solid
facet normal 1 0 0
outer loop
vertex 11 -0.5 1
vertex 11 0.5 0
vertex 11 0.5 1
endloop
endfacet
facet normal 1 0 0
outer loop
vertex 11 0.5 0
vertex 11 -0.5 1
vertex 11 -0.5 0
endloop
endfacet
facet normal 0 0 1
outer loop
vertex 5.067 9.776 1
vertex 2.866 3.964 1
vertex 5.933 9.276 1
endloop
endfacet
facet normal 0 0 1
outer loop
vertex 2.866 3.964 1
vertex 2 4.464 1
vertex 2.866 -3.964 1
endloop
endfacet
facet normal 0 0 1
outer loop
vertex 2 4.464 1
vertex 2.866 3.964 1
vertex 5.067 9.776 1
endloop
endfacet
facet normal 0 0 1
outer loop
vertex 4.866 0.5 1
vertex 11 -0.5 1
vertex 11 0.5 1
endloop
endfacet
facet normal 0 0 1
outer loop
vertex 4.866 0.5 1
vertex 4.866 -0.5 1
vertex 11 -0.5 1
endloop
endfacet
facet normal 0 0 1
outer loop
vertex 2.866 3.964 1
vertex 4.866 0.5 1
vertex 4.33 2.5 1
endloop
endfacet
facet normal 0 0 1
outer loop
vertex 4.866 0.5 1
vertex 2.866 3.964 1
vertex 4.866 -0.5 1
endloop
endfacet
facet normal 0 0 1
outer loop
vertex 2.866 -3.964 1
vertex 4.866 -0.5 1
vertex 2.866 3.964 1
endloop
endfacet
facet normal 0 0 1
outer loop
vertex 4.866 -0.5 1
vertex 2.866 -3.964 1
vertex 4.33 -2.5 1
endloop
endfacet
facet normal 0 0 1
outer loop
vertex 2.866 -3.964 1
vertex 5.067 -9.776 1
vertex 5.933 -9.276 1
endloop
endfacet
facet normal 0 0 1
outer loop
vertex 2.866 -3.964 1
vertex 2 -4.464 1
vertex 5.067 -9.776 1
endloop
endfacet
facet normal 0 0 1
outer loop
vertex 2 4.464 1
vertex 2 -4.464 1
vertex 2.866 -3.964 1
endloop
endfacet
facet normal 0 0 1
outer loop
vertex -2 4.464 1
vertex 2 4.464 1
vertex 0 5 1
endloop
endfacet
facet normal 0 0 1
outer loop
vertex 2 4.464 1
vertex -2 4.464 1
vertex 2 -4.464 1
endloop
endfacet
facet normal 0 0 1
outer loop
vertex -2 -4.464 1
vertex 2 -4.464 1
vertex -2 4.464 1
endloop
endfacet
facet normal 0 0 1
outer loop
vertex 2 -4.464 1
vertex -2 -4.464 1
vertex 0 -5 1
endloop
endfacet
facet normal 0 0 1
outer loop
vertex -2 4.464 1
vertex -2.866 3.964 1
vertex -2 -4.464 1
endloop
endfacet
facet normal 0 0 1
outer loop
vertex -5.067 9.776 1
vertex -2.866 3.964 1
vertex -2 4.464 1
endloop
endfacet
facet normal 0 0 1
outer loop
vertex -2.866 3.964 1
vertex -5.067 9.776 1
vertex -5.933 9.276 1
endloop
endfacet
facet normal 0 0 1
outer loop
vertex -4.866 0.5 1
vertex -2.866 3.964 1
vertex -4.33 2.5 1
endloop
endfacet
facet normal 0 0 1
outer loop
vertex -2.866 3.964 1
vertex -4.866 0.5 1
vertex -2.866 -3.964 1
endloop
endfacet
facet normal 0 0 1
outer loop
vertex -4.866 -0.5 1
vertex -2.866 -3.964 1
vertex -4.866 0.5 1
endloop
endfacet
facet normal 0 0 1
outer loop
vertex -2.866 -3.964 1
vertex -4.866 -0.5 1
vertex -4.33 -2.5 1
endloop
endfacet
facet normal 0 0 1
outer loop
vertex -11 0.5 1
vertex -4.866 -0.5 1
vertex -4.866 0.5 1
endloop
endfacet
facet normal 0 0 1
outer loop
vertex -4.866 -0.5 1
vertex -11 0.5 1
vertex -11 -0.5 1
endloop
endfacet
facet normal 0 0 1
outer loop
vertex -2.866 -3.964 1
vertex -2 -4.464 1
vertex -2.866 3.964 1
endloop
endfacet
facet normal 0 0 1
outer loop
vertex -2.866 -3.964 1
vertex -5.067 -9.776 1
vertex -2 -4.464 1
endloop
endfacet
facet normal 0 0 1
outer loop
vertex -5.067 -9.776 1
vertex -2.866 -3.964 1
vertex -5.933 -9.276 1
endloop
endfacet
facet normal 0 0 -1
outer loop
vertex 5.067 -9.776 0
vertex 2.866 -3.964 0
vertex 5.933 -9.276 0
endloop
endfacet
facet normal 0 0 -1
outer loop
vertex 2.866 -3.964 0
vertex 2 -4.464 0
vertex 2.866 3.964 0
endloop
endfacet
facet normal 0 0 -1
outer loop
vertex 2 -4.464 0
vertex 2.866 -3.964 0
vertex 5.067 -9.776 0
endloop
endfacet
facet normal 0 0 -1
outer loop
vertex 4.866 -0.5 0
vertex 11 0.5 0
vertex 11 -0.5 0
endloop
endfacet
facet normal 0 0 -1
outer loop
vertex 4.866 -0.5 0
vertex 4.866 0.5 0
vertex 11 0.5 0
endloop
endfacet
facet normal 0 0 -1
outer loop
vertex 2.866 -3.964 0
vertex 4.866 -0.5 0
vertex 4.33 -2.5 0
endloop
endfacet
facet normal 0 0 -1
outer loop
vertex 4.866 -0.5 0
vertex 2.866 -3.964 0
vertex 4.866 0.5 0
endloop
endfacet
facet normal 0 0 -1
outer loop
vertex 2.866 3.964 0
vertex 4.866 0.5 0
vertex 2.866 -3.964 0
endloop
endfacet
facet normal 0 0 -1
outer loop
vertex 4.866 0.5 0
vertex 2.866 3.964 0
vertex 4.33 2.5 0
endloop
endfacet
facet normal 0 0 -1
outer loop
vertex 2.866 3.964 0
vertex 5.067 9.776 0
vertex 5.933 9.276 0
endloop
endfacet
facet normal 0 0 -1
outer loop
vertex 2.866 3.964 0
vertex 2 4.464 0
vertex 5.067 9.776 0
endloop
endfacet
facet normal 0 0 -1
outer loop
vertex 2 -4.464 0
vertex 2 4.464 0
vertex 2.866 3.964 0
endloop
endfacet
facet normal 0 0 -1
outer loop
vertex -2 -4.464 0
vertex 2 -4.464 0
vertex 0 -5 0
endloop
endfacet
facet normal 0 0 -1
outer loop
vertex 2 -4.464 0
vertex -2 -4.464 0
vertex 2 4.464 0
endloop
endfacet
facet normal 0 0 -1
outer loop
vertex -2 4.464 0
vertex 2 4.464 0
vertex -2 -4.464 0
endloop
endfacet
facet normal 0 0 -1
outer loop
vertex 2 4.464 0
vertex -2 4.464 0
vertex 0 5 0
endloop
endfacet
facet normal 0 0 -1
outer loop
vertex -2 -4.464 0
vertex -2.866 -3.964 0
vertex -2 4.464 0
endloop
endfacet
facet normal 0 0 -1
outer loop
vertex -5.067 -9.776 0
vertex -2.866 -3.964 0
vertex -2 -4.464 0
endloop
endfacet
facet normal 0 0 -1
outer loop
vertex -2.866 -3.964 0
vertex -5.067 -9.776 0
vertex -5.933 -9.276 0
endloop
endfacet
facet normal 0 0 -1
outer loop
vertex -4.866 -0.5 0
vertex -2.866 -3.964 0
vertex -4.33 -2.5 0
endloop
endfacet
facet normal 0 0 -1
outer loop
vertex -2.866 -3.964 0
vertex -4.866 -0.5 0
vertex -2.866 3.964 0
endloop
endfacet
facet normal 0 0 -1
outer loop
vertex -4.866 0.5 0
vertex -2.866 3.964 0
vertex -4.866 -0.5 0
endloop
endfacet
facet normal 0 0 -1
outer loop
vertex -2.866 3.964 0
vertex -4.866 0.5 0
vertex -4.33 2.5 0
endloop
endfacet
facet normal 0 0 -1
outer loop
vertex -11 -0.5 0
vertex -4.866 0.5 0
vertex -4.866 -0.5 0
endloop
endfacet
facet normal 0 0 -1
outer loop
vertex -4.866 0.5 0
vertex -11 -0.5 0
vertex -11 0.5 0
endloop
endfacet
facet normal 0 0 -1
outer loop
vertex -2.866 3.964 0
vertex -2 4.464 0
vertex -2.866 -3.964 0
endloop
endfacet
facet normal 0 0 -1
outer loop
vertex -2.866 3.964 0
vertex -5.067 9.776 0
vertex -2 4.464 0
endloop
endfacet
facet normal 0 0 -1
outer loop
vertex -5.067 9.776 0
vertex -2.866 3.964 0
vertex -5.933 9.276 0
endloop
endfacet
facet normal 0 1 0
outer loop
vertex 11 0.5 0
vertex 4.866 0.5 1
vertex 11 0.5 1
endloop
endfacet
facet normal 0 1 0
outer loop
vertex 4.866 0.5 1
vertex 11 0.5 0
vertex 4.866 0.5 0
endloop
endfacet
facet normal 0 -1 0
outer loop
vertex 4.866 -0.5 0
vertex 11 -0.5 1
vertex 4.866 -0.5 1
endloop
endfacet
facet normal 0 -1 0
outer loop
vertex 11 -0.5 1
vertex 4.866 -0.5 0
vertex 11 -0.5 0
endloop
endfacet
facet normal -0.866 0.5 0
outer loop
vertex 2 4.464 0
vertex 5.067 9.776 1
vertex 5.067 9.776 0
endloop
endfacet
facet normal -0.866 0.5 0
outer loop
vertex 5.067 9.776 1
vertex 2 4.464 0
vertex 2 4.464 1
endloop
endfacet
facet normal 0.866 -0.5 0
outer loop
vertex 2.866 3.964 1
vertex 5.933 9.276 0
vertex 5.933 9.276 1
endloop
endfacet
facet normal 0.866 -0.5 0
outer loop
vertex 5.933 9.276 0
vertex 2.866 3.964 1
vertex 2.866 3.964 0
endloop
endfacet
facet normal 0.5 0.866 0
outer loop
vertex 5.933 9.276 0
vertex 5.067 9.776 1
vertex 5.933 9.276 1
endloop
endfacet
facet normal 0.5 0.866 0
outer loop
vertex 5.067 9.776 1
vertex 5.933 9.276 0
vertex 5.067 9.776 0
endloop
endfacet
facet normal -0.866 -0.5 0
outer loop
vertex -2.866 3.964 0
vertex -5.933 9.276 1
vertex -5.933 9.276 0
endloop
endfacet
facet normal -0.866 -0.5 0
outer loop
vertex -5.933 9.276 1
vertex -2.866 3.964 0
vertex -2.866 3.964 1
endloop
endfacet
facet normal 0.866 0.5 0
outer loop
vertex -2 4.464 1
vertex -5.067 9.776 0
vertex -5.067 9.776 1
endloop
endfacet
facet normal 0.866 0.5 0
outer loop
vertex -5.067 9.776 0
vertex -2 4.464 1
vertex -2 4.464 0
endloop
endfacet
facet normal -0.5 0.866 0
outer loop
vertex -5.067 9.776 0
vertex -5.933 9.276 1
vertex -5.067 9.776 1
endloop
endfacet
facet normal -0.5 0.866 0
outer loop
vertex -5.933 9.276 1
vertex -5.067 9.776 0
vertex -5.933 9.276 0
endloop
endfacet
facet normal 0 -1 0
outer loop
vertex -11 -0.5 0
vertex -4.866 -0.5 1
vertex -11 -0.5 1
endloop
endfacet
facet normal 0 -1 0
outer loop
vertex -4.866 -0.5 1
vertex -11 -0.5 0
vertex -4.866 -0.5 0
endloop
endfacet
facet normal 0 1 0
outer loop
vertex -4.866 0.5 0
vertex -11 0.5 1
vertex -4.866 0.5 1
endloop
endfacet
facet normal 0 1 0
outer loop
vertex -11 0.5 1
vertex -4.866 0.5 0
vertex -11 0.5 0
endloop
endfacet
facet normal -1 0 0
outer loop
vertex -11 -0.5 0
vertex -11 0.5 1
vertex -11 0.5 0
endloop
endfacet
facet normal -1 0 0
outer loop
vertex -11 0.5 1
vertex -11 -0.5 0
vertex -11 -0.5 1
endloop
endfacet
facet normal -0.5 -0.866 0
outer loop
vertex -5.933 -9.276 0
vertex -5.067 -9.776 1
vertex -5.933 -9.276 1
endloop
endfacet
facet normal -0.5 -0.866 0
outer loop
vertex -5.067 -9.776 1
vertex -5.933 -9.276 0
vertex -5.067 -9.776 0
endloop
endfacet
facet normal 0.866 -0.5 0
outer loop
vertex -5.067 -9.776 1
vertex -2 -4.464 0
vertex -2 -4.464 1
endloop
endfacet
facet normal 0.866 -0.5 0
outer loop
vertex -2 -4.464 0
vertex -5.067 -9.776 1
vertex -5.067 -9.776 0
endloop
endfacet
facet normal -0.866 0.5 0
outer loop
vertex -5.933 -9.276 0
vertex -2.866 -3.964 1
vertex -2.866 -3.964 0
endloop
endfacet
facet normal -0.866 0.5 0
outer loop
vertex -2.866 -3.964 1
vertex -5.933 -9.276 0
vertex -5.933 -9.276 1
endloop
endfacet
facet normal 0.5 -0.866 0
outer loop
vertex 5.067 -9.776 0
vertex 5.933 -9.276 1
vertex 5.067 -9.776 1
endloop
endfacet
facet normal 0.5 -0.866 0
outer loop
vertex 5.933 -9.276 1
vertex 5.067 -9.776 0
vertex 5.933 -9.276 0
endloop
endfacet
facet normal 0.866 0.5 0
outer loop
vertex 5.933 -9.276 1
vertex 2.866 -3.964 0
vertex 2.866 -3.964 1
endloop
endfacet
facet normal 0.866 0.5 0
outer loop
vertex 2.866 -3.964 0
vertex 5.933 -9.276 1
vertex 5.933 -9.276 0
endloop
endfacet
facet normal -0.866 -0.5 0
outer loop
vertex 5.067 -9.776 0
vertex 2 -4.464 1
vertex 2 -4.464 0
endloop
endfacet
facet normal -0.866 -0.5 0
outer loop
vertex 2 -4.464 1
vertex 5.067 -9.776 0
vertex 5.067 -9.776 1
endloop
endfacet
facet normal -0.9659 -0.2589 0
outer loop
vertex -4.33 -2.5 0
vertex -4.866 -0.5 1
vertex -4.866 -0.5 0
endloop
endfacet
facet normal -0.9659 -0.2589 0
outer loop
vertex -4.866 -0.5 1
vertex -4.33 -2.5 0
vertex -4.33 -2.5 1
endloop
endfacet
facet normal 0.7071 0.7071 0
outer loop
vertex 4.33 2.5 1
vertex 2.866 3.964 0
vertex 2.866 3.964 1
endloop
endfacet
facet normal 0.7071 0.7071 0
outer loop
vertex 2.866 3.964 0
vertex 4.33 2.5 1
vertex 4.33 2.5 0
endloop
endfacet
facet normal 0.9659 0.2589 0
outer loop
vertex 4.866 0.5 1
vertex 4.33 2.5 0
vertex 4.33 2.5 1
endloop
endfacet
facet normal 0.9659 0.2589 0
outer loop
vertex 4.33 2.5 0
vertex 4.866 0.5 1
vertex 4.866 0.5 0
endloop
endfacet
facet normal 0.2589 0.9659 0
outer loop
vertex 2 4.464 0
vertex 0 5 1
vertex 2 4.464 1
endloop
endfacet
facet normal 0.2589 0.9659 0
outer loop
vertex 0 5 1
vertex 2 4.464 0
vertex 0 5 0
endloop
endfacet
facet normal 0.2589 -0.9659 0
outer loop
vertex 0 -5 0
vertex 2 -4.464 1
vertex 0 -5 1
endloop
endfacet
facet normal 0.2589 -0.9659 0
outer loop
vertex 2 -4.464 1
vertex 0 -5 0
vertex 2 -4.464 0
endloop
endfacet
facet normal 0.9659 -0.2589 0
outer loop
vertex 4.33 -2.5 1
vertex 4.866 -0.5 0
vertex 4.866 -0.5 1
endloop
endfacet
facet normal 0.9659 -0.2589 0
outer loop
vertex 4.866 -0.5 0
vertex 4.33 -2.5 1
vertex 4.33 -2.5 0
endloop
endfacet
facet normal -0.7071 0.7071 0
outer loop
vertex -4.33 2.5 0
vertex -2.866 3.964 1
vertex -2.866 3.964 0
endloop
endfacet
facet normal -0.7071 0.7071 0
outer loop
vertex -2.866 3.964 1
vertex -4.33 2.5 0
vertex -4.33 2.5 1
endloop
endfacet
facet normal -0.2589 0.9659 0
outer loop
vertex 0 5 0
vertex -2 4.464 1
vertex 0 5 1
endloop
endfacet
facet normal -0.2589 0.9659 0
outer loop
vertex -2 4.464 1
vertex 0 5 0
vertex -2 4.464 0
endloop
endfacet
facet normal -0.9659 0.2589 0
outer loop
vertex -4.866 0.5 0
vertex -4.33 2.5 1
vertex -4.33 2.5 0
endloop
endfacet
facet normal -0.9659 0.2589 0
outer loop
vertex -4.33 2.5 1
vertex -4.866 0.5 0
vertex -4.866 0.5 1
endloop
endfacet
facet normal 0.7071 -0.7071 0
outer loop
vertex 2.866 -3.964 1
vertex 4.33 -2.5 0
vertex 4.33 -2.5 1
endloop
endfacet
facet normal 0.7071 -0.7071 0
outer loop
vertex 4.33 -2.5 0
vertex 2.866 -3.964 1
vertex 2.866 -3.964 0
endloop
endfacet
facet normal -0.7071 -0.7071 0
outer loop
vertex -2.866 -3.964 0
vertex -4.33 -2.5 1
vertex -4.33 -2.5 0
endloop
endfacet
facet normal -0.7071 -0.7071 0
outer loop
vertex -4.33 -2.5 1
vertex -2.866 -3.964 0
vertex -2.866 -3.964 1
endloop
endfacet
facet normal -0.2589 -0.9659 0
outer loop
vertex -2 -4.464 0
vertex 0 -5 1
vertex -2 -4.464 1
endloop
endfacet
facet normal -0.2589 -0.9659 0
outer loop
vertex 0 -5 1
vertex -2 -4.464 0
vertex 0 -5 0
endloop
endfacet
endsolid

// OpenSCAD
n = 6;
cylinder(r=5, $fn=12);
for (i = [0:n-1]) {
    rotate([0, 0, i * 360 / n])
    translate([1, -0.5, 0])
    cube([10, 1, 1]);
}
